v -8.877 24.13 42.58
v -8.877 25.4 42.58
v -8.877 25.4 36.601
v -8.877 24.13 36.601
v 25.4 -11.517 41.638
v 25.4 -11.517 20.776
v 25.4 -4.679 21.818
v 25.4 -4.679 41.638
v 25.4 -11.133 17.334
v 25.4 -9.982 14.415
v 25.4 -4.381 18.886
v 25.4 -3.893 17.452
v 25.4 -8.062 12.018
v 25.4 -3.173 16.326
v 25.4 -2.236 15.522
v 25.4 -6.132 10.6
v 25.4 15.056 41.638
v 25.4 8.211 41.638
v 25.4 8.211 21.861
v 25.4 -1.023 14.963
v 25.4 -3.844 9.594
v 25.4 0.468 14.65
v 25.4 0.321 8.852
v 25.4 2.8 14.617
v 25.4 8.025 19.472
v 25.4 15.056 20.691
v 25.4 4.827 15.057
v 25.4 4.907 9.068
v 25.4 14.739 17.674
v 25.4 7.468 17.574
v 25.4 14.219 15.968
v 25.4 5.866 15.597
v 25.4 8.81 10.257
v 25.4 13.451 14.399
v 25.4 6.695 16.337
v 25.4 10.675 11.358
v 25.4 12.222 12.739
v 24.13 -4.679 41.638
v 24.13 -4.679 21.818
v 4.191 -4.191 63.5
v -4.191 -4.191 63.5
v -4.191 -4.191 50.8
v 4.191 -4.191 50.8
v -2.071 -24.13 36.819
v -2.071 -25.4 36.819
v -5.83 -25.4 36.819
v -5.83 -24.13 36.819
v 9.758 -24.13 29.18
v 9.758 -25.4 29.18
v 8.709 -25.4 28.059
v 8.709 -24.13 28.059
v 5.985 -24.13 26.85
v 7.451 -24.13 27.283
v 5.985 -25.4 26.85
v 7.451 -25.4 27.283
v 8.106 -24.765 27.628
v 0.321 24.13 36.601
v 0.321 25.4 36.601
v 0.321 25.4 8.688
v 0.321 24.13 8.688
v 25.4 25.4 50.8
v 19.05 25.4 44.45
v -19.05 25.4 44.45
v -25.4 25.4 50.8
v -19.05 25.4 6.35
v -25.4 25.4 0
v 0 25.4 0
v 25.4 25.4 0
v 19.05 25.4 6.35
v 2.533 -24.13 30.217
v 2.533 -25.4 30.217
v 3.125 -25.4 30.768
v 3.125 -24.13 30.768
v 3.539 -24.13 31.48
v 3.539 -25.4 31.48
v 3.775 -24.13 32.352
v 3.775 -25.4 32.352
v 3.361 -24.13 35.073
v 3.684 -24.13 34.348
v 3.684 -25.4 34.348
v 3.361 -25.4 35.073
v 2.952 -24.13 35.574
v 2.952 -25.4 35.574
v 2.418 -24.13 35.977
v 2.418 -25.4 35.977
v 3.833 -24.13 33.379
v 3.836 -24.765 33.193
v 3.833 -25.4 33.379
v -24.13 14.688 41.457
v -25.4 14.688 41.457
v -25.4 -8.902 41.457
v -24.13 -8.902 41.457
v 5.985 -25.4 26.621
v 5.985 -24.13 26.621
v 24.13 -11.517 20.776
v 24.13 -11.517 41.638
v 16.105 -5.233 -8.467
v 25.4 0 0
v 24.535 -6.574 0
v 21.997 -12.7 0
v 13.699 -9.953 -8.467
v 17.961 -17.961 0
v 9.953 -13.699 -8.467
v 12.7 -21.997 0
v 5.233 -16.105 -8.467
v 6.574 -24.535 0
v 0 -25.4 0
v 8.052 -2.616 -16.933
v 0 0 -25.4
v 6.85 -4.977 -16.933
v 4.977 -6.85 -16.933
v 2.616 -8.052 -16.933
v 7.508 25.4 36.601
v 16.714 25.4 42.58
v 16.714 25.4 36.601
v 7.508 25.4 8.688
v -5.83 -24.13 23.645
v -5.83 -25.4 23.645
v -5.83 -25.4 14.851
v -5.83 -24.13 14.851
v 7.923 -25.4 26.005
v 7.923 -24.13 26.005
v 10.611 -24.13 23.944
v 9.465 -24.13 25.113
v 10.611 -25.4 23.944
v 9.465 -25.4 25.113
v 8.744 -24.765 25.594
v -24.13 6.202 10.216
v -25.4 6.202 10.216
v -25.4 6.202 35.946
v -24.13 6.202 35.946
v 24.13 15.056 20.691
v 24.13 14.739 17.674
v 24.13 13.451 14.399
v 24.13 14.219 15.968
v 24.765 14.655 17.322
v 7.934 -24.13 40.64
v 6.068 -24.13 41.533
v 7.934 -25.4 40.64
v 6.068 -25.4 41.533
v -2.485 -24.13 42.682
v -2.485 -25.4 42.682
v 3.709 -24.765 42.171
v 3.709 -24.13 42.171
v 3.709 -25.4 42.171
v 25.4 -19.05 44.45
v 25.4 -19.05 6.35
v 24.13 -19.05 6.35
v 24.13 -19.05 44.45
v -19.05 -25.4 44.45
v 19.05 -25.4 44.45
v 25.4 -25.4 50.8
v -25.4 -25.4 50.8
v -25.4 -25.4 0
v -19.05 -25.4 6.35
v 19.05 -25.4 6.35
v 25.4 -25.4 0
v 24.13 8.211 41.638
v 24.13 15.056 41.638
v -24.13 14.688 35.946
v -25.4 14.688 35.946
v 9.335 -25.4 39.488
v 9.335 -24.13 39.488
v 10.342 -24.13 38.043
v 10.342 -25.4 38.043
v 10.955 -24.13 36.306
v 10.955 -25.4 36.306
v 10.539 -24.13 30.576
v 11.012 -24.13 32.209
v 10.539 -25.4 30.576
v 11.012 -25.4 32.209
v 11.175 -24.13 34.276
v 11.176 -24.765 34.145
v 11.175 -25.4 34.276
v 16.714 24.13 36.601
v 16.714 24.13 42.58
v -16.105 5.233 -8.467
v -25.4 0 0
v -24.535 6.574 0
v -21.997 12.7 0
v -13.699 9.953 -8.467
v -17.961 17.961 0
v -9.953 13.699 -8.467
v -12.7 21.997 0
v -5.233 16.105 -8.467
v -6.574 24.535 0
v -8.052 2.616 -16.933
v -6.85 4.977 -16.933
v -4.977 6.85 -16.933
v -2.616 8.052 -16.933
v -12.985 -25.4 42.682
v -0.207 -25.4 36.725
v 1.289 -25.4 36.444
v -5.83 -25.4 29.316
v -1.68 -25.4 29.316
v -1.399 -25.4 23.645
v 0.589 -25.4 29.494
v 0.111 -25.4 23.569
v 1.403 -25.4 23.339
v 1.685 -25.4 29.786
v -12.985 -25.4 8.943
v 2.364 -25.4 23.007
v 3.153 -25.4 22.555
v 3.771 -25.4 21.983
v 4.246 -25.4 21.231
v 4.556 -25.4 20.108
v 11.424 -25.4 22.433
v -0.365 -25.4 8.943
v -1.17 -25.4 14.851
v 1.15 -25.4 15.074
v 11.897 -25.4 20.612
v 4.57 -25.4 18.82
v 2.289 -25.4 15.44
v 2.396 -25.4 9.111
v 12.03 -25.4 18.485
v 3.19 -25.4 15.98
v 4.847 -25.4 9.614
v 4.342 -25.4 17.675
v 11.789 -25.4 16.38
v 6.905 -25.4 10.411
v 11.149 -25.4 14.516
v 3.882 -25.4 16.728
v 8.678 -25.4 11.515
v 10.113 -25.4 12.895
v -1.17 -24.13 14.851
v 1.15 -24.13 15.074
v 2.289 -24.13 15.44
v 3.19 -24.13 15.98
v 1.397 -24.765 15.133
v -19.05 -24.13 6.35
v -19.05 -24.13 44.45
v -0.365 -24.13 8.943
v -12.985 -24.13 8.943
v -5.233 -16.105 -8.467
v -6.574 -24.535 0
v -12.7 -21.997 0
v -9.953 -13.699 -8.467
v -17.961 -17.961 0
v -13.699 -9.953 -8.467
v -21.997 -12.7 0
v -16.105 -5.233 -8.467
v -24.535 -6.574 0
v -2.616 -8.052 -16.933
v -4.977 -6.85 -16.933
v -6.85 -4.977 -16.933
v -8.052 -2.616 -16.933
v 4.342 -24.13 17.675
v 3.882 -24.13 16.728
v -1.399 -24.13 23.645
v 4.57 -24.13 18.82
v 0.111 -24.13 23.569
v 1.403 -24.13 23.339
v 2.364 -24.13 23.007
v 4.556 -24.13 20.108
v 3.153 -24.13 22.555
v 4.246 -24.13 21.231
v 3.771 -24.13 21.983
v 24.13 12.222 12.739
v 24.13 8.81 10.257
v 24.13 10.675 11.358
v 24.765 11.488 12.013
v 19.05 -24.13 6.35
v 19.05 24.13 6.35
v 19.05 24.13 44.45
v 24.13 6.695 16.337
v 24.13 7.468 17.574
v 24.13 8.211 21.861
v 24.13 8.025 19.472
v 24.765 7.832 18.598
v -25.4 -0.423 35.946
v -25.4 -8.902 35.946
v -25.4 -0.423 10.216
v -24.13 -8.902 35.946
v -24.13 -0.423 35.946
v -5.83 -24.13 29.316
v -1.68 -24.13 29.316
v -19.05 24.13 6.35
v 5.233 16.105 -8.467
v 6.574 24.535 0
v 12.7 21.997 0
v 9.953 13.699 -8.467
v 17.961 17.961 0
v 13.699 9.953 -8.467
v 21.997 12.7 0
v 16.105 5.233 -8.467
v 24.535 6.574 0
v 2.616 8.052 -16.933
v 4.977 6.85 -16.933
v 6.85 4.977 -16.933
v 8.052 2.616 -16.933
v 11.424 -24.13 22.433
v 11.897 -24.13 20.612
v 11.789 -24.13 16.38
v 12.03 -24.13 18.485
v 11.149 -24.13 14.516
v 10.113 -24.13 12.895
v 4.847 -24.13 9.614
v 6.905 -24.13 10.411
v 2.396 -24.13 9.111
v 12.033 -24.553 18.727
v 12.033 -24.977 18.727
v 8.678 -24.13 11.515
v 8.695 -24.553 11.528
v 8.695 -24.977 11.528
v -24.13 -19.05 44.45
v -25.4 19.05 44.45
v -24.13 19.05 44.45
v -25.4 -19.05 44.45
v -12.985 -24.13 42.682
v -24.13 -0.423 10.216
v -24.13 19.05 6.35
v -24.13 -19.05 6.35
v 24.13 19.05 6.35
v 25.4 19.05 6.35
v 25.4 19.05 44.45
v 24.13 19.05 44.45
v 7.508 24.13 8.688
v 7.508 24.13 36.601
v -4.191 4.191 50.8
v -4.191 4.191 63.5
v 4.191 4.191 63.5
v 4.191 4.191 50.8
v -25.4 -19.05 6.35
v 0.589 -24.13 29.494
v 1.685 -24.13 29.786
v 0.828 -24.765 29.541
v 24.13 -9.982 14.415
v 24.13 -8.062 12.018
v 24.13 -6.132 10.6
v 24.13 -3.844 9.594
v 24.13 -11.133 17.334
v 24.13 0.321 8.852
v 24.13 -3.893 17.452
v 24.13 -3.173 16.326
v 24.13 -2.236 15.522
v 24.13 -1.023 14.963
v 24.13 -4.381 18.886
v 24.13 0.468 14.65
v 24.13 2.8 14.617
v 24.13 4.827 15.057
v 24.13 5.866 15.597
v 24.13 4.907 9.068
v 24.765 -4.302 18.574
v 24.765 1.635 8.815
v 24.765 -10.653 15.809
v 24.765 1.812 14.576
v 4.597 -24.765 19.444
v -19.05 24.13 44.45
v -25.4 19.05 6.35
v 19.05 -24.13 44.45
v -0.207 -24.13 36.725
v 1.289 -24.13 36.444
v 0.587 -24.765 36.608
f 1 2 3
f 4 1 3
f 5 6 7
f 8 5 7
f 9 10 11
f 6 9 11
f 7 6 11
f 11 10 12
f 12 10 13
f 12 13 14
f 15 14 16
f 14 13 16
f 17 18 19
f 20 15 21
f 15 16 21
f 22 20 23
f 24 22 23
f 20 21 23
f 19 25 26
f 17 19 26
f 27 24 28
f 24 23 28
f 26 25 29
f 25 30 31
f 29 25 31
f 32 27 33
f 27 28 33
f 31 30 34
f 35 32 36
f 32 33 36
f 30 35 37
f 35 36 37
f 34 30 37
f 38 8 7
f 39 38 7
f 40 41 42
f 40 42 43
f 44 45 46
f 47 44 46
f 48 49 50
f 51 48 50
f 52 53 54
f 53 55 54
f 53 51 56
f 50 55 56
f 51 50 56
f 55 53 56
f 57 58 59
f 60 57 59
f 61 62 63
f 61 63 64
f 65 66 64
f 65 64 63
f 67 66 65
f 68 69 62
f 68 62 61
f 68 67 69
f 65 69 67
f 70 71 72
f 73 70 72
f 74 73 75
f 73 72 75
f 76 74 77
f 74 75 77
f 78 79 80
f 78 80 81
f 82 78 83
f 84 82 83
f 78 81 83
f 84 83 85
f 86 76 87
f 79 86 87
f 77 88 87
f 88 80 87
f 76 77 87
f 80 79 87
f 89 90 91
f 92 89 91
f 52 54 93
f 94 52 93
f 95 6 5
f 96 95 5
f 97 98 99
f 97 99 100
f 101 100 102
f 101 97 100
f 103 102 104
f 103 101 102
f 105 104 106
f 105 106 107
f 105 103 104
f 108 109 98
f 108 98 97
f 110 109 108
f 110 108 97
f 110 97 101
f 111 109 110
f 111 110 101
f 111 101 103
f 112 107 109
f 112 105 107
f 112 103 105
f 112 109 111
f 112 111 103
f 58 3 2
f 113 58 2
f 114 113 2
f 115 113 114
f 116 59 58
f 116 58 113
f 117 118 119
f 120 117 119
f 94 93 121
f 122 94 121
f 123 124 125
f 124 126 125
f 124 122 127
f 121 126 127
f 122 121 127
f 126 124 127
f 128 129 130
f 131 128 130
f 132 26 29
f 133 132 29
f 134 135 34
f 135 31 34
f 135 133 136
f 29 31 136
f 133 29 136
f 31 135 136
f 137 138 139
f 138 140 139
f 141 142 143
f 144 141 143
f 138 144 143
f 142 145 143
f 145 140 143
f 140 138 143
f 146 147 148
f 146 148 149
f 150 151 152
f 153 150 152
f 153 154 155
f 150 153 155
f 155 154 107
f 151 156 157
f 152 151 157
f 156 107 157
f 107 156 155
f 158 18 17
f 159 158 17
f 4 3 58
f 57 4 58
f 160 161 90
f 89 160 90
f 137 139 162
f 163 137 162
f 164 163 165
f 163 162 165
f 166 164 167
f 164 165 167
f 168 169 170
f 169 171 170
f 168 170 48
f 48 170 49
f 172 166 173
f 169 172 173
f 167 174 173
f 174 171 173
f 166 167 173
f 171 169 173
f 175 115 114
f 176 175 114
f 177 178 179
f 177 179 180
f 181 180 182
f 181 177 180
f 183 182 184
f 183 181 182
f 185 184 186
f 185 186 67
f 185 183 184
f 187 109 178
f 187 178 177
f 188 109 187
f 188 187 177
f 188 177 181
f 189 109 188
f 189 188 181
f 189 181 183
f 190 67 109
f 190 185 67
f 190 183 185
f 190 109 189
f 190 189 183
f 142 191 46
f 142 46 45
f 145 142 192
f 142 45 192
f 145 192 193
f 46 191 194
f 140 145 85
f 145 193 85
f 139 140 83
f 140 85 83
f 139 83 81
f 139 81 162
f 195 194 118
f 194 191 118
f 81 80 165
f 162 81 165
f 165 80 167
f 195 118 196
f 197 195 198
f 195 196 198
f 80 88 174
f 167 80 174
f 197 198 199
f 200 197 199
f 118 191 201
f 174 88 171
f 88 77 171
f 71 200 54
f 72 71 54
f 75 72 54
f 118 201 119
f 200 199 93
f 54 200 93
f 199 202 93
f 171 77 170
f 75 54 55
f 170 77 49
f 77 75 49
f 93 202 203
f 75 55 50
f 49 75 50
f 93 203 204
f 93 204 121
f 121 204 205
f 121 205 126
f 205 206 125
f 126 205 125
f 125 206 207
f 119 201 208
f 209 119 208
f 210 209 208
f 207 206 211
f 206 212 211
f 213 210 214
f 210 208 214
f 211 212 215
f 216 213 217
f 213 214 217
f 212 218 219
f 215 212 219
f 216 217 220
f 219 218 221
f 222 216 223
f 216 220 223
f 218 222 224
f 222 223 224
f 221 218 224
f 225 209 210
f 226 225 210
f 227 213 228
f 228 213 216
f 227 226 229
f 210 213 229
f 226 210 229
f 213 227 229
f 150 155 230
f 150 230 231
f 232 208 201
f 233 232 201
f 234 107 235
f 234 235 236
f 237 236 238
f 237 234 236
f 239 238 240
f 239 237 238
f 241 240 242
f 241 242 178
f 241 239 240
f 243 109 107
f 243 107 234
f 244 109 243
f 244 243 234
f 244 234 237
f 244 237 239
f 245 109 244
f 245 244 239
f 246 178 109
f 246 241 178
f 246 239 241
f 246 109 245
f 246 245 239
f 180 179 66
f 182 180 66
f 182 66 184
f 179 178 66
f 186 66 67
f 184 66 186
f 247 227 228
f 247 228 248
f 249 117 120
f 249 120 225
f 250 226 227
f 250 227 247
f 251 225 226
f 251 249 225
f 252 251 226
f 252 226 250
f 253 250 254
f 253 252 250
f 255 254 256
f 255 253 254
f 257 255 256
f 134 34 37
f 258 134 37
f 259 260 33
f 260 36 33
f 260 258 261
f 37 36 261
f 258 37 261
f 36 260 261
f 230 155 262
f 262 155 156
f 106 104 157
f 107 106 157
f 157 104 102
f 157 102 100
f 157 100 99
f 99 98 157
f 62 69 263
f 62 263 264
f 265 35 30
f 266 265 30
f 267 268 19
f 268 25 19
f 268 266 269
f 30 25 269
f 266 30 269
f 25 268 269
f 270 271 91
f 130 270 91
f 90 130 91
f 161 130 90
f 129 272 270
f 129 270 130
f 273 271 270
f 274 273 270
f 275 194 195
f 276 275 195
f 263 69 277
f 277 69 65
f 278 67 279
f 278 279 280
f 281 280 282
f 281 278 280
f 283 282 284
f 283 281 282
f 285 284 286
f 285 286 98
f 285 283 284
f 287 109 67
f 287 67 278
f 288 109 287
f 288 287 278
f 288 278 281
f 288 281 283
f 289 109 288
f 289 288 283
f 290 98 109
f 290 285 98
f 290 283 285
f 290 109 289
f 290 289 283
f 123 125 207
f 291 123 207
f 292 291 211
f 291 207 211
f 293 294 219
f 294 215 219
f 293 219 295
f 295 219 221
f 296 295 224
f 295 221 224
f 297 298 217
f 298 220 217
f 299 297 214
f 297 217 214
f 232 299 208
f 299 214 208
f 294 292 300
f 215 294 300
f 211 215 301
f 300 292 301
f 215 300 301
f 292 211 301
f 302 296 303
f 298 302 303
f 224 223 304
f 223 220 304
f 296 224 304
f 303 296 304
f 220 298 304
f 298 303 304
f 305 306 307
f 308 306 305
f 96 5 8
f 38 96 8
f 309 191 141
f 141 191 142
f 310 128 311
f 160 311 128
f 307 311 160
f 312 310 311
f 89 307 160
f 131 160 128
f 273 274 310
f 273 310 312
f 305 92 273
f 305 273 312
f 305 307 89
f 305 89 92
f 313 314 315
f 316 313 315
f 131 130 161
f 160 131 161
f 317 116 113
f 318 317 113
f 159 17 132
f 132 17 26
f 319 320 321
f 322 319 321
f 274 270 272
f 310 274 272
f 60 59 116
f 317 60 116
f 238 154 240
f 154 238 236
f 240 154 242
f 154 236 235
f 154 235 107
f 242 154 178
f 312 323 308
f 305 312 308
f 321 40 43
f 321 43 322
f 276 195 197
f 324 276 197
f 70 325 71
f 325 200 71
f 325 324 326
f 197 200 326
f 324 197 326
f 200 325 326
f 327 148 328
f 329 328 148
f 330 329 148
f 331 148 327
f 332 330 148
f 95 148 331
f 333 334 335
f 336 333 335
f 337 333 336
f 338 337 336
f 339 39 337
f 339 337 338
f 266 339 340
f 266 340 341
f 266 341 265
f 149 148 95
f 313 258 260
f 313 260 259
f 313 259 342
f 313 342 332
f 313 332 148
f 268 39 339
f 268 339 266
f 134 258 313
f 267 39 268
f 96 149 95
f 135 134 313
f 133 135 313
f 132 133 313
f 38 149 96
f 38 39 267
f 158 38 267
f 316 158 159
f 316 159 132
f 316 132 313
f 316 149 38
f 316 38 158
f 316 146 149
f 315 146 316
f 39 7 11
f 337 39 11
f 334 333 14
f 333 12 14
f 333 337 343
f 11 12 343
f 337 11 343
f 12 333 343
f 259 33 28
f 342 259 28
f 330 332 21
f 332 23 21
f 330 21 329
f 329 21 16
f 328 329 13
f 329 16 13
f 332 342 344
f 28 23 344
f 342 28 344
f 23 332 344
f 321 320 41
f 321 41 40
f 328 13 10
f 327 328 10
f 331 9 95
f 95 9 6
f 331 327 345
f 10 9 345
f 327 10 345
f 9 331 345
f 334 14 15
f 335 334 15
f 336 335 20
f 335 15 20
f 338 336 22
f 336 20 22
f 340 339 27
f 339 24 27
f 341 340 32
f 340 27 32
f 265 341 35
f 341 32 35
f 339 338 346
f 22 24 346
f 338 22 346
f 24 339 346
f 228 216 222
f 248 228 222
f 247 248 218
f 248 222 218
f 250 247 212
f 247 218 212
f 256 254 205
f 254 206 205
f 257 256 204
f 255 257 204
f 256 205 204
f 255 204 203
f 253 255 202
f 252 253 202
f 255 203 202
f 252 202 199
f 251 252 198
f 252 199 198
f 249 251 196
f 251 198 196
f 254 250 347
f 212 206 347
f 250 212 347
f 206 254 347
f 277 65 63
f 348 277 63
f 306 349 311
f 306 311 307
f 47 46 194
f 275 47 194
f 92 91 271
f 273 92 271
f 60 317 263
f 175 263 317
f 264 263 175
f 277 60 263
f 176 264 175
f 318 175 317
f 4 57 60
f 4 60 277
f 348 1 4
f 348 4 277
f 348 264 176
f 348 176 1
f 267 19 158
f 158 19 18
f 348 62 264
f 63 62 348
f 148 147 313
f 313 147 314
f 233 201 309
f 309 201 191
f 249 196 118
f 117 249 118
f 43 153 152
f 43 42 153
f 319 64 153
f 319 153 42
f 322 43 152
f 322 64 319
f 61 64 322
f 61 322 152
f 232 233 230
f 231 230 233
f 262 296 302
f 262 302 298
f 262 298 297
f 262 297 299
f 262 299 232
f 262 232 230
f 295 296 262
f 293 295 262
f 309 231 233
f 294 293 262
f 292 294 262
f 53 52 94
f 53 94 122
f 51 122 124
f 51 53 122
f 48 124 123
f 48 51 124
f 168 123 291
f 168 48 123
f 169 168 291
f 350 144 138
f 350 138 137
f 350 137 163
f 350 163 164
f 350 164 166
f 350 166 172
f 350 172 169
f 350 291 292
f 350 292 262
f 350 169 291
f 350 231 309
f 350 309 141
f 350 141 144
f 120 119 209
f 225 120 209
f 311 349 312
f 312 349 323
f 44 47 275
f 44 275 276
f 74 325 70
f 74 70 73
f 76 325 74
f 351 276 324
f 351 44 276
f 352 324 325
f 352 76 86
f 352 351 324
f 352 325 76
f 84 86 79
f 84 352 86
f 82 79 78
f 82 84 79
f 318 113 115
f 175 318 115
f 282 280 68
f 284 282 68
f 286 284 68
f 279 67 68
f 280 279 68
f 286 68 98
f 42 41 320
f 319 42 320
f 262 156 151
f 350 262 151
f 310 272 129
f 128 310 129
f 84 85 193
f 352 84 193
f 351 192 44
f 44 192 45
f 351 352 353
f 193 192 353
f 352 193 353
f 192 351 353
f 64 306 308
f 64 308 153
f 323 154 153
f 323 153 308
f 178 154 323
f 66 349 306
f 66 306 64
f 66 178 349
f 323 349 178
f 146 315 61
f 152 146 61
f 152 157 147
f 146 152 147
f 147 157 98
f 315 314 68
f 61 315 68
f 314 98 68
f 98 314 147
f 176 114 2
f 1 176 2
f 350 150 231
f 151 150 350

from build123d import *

# Parameters (mm, degrees)
F0_W      = 50.8
F0_H      = 50.8
F1_DEPTH  = 50.8
F2_W      = 38.1
F2_H      = 38.1
F3_DEPTH  = 1.27
F4_W      = 38.1
F4_H      = 38.1
F5_DEPTH  = 1.27
F6_W      = 38.1
F6_H      = 38.1
F7_DEPTH  = 1.27
F8_W      = 38.1
F8_H      = 38.1
F9_DEPTH  = 1.27
F10_W     = 8.382
F10_H     = 8.382
F11_DEPTH = 12.7
F13_DEPTH = 25.4
F14_SIZE  = 25.39999


# Not quite as in the source:
# - a fillet or chamfer is up to 0.001 mm smaller than in the source, because OpenCascade refuses the exact size


with BuildPart() as f1:
    # F0 (on Top) → F1 (new body)
    with BuildSketch(Plane.XY):
        Rectangle(F0_W, F0_H)
    extrude(amount=F1_DEPTH)

    # F2 (on face) → F3 (cut)
    with BuildSketch(Plane.XZ.offset(25.4)):
        with Locations((0, 25.4)):
            Rectangle(F2_W, F2_H)
        with BuildLine():
            Line((-12.9850329568, 8.9432131499), (-12.9850329568, 42.6816119349))
            Line((-12.9850329568, 42.6816119349), (-2.484703985, 42.6816119349))
            add(Edge.make_bspline(
                [(-2.484703985, 42.6816119349), (4.6927360717, 42.6816119349), (7.9343988133, 40.6398813015)],
                knots=[0, 0, 0, 1, 1, 1], degree=2))
            add(Edge.make_bspline(
                [(7.9343988133, 40.6398813015), (11.176061555, 38.5981506681), (11.176061555, 34.1454795218)],
                knots=[0, 0, 0, 1, 1, 1], degree=2))
            add(Edge.make_bspline(
                [(11.176061555, 34.1454795218), (11.176061555, 31.1179585102), (9.7582956179, 29.1796066431)],
                knots=[0, 0, 0, 1, 1, 1], degree=2))
            add(Edge.make_bspline(
                [(9.7582956179, 29.1796066431), (8.3405296807, 27.2412547759), (5.9849706498, 26.8498923037)],
                knots=[0, 0, 0, 1, 1, 1], degree=2))
            Line((5.9849706498, 26.8498923037), (5.9849706498, 26.6209821784))
            add(Edge.make_bspline(
                [(5.9849706498, 26.6209821784), (9.1897124035, 25.9047150123), (10.6111704394, 23.9442105523)],
                knots=[0, 0, 0, 1, 1, 1], degree=2))
            add(Edge.make_bspline(
                [(10.6111704394, 23.9442105523), (12.0326284753, 21.9837060924), (12.0326284753, 18.7272749556)],
                knots=[0, 0, 0, 1, 1, 1], degree=2))
            add(Edge.make_bspline(
                [(12.0326284753, 18.7272749556), (12.0326284753, 14.1121514623), (8.694971165, 11.5276823061)],
                knots=[0, 0, 0, 1, 1, 1], degree=2))
            add(Edge.make_bspline(
                [(8.694971165, 11.5276823061), (5.3573138547, 8.9432131499), (-0.3654392769, 8.9432131499)],
                knots=[0, 0, 0, 1, 1, 1], degree=2))
            Line((-0.3654392769, 8.9432131499), (-12.9850329568, 8.9432131499))
        make_face(mode=Mode.SUBTRACT)
        with BuildLine():
            Line((-5.8297454929, 36.8185590491), (-5.8297454929, 29.3162142985))
            Line((-5.8297454929, 29.3162142985), (-1.6798264478, 29.3162142985))
            add(Edge.make_bspline(
                [(-1.6798264478, 29.3162142985), (1.2295474023, 29.3162142985), (2.5328582768, 30.2170864044)],
                knots=[0, 0, 0, 1, 1, 1], degree=2))
            add(Edge.make_bspline(
                [(2.5328582768, 30.2170864044), (3.8361691513, 31.1179585102), (3.8361691513, 33.1929180328)],
                knots=[0, 0, 0, 1, 1, 1], degree=2))
            add(Edge.make_bspline(
                [(3.8361691513, 33.1929180328), (3.8361691513, 35.1349619988), (2.4184032142, 35.9767605239)],
                knots=[0, 0, 0, 1, 1, 1], degree=2))
            add(Edge.make_bspline(
                [(2.4184032142, 35.9767605239), (1.0006372771, 36.8185590491), (-2.07118892, 36.8185590491)],
                knots=[0, 0, 0, 1, 1, 1], degree=2))
            Line((-2.07118892, 36.8185590491), (-5.8297454929, 36.8185590491))
        make_face()
        with BuildLine():
            Line((-1.3992269394, 23.64515055), (-5.8297454929, 23.64515055))
            Line((-5.8297454929, 23.64515055), (-5.8297454929, 14.8505712213))
            Line((-5.8297454929, 14.8505712213), (-1.1703168141, 14.8505712213))
            add(Edge.make_bspline(
                [(-1.1703168141, 14.8505712213), (1.7833622215, 14.8505712213), (3.1900518623, 15.9803534524)],
                knots=[0, 0, 0, 1, 1, 1], degree=2))
            add(Edge.make_bspline(
                [(3.1900518623, 15.9803534524), (4.596741503, 17.1101356836), (4.596741503, 19.4435421217)],
                knots=[0, 0, 0, 1, 1, 1], degree=2))
            add(Edge.make_bspline(
                [(4.596741503, 19.4435421217), (4.596741503, 23.64515055), (-1.3992269394, 23.64515055)],
                knots=[0, 0, 0, 1, 1, 1], degree=2))
        make_face()
    extrude(amount=-F3_DEPTH, mode=Mode.SUBTRACT)

    # F4 (on face) → F5 (cut)
    with BuildSketch(Plane.YZ.offset(25.4)):
        with Locations((0, 25.4)):
            Rectangle(F4_W, F4_H)
        with BuildLine():
            Line((8.2110515278, 41.6381866004), (15.0563287647, 41.6381866004))
            Line((15.0563287647, 41.6381866004), (15.0563287647, 20.6913548071))
            add(Edge.make_bspline(
                [(15.0563287647, 20.6913548071), (15.0563287647, 17.098647189), (13.4513025803, 14.3988018192)],
                knots=[0, 0, 0, 1, 1, 1], degree=2))
            add(Edge.make_bspline(
                [(13.4513025803, 14.3988018192), (11.8462763959, 11.6989564493), (8.8098361308, 10.2569130563)],
                knots=[0, 0, 0, 1, 1, 1], degree=2))
            add(Edge.make_bspline(
                [(8.8098361308, 10.2569130563), (5.7733958658, 8.8148696632), (1.6350502071, 8.8148696632)],
                knots=[0, 0, 0, 1, 1, 1], degree=2))
            add(Edge.make_bspline(
                [(1.6350502071, 8.8148696632), (-4.6078993227, 8.8148696632), (-8.0624258786, 12.0178358237)],
                knots=[0, 0, 0, 1, 1, 1], degree=2))
            add(Edge.make_bspline(
                [(-8.0624258786, 12.0178358237), (-11.5169524345, 15.2208019843), (-11.5169524345, 20.776389307)],
                knots=[0, 0, 0, 1, 1, 1], degree=2))
            Line((-11.5169524345, 20.776389307), (-11.5169524345, 41.6381866004))
            Line((-11.5169524345, 41.6381866004), (-4.6787614059, 41.6381866004))
            Line((-4.6787614059, 41.6381866004), (-4.6787614059, 21.81806193))
            add(Edge.make_bspline(
                [(-4.6787614059, 21.81806193), (-4.6787614059, 18.0765439371), (-3.1729421379, 16.3262504822)],
                knots=[0, 0, 0, 1, 1, 1], degree=2))
            add(Edge.make_bspline(
                [(-3.1729421379, 16.3262504822), (-1.66712287, 14.5759570272), (1.8122054151, 14.5759570272)],
                knots=[0, 0, 0, 1, 1, 1], degree=2))
            add(Edge.make_bspline(
                [(1.8122054151, 14.5759570272), (5.178154367, 14.5759570272), (6.6946029474, 16.3368797946)],
                knots=[0, 0, 0, 1, 1, 1], degree=2))
            add(Edge.make_bspline(
                [(6.6946029474, 16.3368797946), (8.2110515278, 18.0978025621), (8.2110515278, 21.8605791799)],
                knots=[0, 0, 0, 1, 1, 1], degree=2))
            Line((8.2110515278, 21.8605791799), (8.2110515278, 41.6381866004))
        make_face(mode=Mode.SUBTRACT)
    extrude(amount=-F5_DEPTH, mode=Mode.SUBTRACT)

    # F6 (on face) → F7 (cut)
    with BuildSketch(Plane(origin=(0, 25.4, 0), x_dir=(-1, 0, 0), z_dir=(0, 1, 0))):
        with Locations((0, 25.4)):
            Rectangle(F6_W, F6_H)
        Polygon((-0.3206622132, 36.6013397979), (-0.3206622132, 8.6884368211), (-7.5084387172, 8.6884368211), (-7.5084387172, 36.6013397979), (-16.713836696, 36.6013397979), (-16.713836696, 42.5800269622), (8.8773180396, 42.5800269622), (8.8773180396, 36.6013397979), align=None, mode=Mode.SUBTRACT)
    extrude(amount=-F7_DEPTH, mode=Mode.SUBTRACT)

    # F8 (on face) → F9 (cut)
    with BuildSketch(Plane(origin=(-25.4, 0, 0), x_dir=(0, -1, 0), z_dir=(-1, 0, 0))):
        with Locations((0, 25.4)):
            Rectangle(F8_W, F8_H)
        Polygon((0.4234320166, 35.945847888), (0.4234320166, 10.2160740644), (-6.2021727762, 10.2160740644), (-6.2021727762, 35.945847888), (-14.6875964581, 35.945847888), (-14.6875964581, 41.4569288611), (8.902018129, 41.4569288611), (8.902018129, 35.945847888), align=None, mode=Mode.SUBTRACT)
    extrude(amount=-F9_DEPTH, mode=Mode.SUBTRACT)

    # F10 (on face) → F11 (join)
    with BuildSketch(Plane.XY.offset(50.8)):
        Rectangle(F10_W, F10_H)
    extrude(amount=F11_DEPTH)

    # F12 (on face) → F13 (join)
    with BuildSketch(Plane(origin=(0, 0, 0), x_dir=(1, 0, 0), z_dir=(0, 0, -1))):
        with BuildLine():
            ThreePointArc((3.01e-08, -25.4), (17.9605122528, -17.9605122315), (25.4, 0))
            ThreePointArc((25.4, 0), (17.9605122594, 17.9605122249), (4.89e-08, 25.4))
            ThreePointArc((4.89e-08, 25.4), (-17.9605122127, 17.9605122716), (-25.4, 3.44e-08))
            ThreePointArc((-25.4, 3.44e-08), (-17.9605122437, -17.9605122406), (3.01e-08, -25.4))
        make_face()
    extrude(amount=F13_DEPTH)

    # F14 (size 25.4 in the source; OpenCascade refuses exactly that, so slightly less here)
    f14_edges = [f1.edges().sort_by_distance(p)[0] for p in [
        (0, -25.4, -25.4),
    ]]
    chamfer(f14_edges, length=F14_SIZE)


solid = f1.part
